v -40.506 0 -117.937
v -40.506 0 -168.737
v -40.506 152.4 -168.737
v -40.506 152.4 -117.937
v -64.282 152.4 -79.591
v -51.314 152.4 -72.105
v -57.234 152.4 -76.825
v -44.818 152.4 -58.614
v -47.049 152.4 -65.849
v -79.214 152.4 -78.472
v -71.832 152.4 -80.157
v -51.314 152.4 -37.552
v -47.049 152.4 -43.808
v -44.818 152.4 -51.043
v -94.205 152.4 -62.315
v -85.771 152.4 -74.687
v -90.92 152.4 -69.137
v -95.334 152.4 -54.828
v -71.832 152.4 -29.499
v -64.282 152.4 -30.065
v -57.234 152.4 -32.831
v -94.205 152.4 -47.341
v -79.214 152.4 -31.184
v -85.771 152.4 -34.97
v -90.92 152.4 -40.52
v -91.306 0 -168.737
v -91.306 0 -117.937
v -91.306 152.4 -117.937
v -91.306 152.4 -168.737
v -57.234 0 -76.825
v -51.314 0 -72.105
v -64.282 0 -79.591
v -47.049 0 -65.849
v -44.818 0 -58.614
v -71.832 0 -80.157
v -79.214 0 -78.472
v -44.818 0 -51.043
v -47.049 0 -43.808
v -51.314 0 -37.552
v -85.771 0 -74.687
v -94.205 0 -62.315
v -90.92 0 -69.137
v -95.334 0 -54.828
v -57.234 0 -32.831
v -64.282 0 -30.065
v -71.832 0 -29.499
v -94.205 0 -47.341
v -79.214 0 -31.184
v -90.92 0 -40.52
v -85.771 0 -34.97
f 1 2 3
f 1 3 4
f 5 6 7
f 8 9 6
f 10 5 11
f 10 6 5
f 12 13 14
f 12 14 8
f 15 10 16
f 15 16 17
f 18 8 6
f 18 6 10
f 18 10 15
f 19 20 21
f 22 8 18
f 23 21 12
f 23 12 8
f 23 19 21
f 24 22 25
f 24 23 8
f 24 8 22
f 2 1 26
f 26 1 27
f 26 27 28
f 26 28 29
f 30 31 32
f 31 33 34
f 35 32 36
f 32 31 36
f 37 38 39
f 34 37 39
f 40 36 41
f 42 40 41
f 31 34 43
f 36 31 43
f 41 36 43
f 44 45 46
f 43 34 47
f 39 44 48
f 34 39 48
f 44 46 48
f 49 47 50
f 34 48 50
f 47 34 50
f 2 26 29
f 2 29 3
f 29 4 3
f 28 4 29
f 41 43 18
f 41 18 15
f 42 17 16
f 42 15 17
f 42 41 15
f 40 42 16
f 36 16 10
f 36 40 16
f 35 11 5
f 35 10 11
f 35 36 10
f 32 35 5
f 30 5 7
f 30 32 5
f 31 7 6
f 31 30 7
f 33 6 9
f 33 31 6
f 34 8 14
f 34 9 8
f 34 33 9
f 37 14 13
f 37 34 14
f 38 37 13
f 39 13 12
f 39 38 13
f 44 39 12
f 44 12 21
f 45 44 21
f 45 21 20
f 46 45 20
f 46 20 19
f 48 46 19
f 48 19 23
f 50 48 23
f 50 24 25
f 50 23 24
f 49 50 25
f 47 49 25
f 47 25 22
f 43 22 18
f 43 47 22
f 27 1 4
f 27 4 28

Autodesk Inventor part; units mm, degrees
ref_plane "YZ Plane" through (0, 0, 0) normal (1, 0, 0) x (0, 1, 0)
ref_plane "XZ Plane" through (0, 0, 0) normal (0, 1, 0) x (-1, 0, 0)
ref_plane "XY Plane" through (0, 0, 0) normal (0, 0, 1) x (1, 0, 0)
sketch "Sketch1" plane through (0, 0, 0) normal (0, 1, 0) x (-1, 0, 0)
  line L0 (40.5057, -117.9366) -> (91.3057, -117.9366)
  line L1 (91.3057, -117.9366) -> (91.3057, -168.7366)
  line L2 (91.3057, -168.7366) -> (40.5057, -168.7366)
  line L3 (40.5057, -168.7366) -> (40.5057, -117.9366)
  circle A0 centre (69.9339, -54.8282) radius 25.4
  point P0 (0, 0)
  dimension "d0" = 50.8
  dimension "d1" = 50.8
  dimension "d2" = 50.8
extrude "Extrusion1" add sketch "Sketch1" along normal blind 152.4
properties part number "pegs"
